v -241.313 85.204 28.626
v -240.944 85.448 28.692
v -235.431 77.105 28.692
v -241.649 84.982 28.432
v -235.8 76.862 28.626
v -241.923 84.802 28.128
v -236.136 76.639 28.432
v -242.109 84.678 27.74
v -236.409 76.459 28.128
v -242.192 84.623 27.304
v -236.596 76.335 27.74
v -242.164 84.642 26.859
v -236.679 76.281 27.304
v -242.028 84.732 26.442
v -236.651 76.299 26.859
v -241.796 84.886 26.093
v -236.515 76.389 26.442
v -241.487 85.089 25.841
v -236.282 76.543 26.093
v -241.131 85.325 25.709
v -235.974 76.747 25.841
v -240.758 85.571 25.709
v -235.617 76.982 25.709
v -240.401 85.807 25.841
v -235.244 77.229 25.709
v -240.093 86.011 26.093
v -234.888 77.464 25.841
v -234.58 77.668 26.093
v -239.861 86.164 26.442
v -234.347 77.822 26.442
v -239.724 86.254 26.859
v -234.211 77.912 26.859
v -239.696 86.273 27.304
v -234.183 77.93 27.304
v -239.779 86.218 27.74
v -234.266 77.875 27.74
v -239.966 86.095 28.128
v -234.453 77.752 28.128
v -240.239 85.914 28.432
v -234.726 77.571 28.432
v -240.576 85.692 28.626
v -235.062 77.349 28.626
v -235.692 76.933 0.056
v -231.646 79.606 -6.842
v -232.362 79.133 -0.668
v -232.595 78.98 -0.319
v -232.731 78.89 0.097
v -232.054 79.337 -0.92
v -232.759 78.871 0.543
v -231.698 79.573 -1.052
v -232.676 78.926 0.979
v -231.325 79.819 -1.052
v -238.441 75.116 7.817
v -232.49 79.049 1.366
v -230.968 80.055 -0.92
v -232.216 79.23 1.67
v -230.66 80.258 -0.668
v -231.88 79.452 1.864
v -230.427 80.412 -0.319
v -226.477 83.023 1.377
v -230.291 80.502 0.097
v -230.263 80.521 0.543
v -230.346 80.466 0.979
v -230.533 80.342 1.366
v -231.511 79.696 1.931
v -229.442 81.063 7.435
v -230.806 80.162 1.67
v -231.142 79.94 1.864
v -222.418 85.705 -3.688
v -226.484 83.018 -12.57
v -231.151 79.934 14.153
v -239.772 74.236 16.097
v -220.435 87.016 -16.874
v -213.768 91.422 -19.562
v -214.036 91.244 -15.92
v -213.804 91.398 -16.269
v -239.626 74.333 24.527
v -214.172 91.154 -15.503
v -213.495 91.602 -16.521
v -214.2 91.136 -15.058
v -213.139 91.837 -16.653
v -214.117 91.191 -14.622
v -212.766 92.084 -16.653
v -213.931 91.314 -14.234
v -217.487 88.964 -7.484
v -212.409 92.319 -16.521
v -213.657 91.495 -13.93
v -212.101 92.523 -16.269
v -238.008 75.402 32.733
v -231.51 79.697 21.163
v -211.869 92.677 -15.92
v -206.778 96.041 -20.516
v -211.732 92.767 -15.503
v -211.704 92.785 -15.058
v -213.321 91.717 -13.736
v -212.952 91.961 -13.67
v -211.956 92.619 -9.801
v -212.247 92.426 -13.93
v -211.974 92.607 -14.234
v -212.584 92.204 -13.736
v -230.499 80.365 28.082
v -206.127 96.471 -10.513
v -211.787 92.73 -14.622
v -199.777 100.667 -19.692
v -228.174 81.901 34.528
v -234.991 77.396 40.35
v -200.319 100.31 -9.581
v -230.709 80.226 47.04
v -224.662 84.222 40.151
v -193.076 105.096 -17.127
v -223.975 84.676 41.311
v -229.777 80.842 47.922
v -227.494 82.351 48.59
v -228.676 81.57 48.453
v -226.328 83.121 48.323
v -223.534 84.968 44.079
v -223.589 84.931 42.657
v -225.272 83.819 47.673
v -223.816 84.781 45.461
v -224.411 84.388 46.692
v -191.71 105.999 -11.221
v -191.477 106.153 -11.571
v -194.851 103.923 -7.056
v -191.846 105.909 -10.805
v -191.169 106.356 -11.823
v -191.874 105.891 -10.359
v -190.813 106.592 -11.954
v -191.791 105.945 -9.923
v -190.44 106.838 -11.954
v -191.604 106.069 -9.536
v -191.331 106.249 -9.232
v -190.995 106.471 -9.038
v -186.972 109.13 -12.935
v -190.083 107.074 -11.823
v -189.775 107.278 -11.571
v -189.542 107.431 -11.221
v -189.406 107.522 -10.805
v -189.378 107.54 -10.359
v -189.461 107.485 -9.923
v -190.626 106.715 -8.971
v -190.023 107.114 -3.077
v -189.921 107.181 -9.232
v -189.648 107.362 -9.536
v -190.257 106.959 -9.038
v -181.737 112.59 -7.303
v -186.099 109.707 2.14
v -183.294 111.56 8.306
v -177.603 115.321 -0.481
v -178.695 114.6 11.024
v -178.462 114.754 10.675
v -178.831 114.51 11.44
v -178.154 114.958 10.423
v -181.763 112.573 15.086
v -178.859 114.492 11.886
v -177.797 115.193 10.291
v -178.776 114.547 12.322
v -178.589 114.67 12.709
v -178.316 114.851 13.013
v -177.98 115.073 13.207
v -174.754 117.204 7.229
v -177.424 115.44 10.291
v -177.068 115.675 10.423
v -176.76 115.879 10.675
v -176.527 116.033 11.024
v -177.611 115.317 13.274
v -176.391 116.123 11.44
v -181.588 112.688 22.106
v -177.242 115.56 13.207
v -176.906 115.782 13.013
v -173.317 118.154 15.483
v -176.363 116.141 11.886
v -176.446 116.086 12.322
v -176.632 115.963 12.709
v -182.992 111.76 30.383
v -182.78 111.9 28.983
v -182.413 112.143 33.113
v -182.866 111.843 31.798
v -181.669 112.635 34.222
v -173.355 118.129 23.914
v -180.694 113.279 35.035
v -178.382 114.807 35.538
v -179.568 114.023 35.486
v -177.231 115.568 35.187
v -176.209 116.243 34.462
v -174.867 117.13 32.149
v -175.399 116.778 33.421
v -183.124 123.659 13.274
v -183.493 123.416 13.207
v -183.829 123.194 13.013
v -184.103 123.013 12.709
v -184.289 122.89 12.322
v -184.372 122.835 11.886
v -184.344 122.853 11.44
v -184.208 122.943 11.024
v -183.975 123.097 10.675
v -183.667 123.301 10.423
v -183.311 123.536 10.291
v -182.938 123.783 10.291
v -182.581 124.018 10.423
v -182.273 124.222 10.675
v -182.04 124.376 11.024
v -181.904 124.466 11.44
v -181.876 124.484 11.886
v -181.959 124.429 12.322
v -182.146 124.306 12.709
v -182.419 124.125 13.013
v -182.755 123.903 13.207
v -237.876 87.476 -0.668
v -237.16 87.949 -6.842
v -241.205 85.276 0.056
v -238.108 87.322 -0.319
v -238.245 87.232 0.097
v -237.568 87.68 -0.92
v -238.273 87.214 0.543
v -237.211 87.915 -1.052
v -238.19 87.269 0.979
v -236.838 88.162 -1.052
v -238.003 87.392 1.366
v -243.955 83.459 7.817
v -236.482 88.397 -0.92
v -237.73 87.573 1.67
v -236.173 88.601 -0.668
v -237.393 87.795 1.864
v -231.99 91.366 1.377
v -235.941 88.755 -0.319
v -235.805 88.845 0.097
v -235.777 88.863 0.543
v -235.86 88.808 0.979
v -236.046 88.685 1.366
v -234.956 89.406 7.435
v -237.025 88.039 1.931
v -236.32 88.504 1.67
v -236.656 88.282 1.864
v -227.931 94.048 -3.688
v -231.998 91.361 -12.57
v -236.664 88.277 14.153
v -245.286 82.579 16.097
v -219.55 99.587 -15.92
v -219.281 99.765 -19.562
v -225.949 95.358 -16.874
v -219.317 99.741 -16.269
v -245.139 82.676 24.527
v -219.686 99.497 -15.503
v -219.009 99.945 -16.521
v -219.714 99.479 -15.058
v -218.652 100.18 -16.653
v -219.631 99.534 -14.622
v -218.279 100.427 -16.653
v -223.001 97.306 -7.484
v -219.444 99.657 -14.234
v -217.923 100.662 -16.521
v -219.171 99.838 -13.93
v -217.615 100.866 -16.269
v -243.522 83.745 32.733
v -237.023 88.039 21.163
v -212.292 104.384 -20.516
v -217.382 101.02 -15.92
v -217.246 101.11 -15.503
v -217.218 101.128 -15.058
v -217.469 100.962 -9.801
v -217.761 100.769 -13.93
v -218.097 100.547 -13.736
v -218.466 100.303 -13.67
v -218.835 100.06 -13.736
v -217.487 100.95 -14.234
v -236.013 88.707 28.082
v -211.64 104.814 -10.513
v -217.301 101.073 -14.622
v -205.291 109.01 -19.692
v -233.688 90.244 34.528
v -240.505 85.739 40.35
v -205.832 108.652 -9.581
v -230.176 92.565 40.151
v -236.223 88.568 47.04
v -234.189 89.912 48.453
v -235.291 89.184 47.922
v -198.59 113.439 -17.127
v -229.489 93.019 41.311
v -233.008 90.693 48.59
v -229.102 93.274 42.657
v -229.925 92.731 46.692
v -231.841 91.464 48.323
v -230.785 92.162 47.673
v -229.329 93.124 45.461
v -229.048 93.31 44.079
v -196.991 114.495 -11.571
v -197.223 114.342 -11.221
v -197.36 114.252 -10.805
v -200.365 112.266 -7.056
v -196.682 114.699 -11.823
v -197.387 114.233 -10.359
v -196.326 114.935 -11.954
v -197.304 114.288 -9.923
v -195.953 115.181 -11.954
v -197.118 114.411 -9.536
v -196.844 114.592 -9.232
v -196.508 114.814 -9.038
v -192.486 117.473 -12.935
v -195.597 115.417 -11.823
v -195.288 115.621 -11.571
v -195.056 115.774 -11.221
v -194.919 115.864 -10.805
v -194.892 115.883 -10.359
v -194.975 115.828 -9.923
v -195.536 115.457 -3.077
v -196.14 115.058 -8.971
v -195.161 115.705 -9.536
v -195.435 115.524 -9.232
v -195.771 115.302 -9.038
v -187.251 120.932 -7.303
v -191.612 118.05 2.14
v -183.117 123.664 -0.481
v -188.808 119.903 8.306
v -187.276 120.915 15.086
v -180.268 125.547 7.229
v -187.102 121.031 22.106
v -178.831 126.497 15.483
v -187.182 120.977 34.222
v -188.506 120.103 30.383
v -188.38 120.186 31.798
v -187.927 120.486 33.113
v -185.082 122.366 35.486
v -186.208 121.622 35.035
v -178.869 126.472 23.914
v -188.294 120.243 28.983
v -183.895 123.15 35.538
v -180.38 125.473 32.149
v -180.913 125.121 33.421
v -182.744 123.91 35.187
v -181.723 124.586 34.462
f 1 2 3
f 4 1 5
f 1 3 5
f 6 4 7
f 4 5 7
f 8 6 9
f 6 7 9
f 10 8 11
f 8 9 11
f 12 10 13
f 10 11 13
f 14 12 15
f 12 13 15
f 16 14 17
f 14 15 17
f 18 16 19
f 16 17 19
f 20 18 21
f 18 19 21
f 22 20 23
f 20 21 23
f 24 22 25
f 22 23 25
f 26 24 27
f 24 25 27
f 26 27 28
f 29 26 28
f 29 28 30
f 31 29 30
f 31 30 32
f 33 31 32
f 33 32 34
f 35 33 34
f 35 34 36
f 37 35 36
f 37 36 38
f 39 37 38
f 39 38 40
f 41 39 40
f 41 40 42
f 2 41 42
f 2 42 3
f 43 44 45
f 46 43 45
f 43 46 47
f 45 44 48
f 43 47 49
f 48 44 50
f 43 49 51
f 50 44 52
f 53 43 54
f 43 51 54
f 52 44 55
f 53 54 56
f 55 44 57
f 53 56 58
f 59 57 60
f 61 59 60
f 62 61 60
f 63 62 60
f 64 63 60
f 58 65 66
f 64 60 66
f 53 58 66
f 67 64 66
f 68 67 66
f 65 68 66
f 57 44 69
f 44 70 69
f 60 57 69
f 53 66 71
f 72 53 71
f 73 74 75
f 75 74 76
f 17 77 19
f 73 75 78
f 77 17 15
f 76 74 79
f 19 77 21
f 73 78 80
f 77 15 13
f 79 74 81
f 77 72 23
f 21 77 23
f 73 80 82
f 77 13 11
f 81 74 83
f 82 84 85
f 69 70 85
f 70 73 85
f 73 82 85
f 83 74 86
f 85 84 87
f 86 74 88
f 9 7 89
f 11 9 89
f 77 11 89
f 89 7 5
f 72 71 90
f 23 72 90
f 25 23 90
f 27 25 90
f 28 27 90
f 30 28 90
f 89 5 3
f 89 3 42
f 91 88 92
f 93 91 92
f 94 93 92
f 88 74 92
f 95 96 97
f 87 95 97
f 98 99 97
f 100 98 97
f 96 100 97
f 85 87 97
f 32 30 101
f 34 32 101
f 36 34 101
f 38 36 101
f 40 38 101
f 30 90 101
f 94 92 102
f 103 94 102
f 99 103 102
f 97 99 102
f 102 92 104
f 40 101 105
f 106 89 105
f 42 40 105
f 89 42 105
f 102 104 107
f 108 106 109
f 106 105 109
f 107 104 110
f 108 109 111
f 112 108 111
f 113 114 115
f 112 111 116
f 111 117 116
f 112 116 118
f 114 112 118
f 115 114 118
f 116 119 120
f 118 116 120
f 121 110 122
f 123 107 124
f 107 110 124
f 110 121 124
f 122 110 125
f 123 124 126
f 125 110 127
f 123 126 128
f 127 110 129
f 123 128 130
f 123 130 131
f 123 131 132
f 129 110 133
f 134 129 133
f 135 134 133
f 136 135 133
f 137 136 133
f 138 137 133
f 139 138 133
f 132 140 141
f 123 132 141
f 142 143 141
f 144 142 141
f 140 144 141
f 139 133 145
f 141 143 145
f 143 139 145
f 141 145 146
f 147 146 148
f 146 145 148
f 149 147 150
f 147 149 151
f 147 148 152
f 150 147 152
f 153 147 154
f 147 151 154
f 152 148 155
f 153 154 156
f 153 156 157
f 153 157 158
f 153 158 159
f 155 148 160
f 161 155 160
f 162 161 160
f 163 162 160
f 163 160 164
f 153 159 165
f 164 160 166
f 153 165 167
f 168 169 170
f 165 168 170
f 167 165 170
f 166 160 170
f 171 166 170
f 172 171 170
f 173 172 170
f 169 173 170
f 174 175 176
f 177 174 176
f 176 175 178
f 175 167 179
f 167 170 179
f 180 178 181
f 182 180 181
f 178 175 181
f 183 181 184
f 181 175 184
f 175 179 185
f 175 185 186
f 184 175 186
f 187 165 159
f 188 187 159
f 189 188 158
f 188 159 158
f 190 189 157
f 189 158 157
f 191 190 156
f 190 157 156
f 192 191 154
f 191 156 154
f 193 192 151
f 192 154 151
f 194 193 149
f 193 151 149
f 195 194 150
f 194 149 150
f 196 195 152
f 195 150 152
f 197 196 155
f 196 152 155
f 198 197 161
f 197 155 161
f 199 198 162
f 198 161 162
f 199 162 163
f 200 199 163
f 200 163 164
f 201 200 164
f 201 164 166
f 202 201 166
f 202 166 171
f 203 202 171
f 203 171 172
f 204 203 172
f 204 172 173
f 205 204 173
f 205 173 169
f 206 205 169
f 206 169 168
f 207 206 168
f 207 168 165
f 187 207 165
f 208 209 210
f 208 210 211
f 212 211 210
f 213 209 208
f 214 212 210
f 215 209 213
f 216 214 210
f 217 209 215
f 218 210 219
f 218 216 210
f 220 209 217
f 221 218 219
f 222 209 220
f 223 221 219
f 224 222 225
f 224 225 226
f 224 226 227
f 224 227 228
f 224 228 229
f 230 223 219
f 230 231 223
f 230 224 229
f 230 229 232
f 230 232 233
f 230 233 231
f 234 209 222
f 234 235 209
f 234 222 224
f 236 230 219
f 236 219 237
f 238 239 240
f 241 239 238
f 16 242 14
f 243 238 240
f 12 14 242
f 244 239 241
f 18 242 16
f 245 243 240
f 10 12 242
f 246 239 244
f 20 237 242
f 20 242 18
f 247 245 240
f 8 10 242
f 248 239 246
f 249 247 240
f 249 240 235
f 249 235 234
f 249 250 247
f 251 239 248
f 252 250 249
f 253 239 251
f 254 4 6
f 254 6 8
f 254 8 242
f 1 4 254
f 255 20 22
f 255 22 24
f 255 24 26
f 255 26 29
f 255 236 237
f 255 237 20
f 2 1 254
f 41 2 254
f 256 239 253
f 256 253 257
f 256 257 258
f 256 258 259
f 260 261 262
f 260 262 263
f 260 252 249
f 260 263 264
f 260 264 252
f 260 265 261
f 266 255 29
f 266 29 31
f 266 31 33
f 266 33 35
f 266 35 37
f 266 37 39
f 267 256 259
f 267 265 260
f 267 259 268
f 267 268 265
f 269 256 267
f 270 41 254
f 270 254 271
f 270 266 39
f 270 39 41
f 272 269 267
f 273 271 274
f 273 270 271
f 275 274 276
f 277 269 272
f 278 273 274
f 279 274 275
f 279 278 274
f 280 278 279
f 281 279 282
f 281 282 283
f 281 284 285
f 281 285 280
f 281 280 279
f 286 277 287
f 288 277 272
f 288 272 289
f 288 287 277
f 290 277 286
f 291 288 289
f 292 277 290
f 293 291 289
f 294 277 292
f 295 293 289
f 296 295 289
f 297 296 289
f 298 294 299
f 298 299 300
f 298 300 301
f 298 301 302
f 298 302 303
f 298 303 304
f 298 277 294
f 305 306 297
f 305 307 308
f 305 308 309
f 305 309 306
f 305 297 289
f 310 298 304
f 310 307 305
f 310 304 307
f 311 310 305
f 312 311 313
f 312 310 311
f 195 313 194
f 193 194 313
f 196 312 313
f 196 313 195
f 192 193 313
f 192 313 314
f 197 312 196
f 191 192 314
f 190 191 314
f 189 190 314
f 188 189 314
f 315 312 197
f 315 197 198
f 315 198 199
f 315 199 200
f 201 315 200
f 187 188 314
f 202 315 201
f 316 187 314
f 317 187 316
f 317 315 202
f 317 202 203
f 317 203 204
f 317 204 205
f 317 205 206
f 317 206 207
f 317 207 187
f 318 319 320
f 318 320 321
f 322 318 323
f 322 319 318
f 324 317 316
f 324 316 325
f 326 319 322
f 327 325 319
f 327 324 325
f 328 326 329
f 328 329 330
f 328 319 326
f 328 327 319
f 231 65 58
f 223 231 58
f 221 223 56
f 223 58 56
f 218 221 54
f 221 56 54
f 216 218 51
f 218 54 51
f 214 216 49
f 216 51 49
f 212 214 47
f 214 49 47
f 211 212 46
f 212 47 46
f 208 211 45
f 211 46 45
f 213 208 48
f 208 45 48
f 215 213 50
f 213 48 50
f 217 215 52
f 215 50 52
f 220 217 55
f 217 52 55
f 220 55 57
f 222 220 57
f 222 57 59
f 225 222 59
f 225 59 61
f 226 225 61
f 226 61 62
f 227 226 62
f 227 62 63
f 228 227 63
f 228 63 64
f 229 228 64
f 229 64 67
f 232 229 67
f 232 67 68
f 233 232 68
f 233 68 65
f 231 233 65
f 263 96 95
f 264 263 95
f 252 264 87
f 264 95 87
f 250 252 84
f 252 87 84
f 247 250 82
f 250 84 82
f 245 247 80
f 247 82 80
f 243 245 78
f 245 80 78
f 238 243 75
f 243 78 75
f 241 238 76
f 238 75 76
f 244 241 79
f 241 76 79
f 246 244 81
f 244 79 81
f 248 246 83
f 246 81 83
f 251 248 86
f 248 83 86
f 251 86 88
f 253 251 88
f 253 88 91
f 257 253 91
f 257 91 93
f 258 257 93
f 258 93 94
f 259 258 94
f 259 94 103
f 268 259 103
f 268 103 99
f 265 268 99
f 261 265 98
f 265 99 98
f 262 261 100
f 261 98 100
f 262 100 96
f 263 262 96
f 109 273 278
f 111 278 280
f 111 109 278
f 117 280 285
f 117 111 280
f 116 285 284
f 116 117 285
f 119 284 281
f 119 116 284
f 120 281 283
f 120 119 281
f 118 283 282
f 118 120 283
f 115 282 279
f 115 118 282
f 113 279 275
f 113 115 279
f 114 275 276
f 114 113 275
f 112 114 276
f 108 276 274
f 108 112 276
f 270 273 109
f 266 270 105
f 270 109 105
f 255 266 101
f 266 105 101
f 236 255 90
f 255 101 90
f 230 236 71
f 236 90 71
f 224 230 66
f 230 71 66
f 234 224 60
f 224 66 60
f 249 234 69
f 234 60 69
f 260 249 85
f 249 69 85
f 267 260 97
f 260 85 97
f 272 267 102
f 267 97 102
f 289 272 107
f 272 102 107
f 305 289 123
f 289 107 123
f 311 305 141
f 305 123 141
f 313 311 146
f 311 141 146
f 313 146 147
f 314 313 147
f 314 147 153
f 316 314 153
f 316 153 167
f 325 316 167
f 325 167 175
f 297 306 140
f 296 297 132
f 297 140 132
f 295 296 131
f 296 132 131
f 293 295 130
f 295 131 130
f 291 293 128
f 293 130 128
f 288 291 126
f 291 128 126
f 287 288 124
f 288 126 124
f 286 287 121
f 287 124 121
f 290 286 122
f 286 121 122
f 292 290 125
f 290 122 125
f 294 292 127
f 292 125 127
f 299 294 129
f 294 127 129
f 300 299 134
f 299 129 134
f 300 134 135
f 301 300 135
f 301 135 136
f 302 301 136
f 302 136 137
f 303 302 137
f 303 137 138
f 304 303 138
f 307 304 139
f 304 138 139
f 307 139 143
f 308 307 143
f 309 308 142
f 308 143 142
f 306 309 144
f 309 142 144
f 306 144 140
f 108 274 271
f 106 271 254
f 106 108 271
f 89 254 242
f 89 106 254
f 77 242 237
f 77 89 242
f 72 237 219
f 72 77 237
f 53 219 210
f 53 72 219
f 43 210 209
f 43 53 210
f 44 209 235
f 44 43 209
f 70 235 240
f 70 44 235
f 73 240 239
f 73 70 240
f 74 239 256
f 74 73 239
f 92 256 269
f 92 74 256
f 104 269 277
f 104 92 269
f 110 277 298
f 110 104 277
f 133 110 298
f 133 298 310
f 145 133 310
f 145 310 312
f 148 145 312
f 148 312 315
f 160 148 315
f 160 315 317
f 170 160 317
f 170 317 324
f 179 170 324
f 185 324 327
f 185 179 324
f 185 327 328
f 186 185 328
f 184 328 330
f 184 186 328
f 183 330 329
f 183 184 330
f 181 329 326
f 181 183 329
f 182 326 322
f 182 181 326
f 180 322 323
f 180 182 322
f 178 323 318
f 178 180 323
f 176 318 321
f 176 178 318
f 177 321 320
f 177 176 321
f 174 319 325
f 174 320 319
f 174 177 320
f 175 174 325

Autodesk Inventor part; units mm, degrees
ref_plane "Work Plane1" through (-147.3677, -4.0754, 130.4495) normal (-0.5513437, 0.8342782, 0) x (0, 0, 1)
ref_plane "Work Plane2" through (-176.5966, 115.9868, 180.7146) normal (-0.5513437, 0.8342782, 0) x (0.1811695, 0.1197283, 0.9761366)
sketch "Sketch2" plane through (-176.5966, 115.9868, 180.7146) normal (-0.5513437, 0.8342782, 0) x (0.1811695, 0.1197283, 0.9761366)
  arc A0 (82.4936, -40) -> (107.4936, -33.3012) centre (82.4936, 10) ccw projected
  line L0 (107.4936, -33.3012) -> (126.4432, -22.3607) projected
  arc A1 (132.9687, -23.7251) -> (126.4432, -22.3607) centre (128.9432, -26.6908) ccw projected
  arc A2 (132.9687, -23.7251) -> (132.9687, 23.7251) centre (165.173, 0) ccw projected
  arc A3 (126.4432, 22.3607) -> (132.9687, 23.7251) centre (128.9432, 26.6908) ccw projected
  line L1 (126.4432, 22.3607) -> (107.4936, 33.3012) projected
  arc A4 (107.4936, 33.3012) -> (82.4936, 40) centre (82.4936, -10) ccw projected
  line L2 (-82.4936, 40) -> (82.4936, 40) projected
  arc A5 (-82.4936, 40) -> (-107.4936, 33.3012) centre (-82.4936, -10) ccw projected
  line L3 (-107.4936, 33.3012) -> (-126.4432, 22.3607) projected
  arc A6 (-132.9687, 23.7251) -> (-126.4432, 22.3607) centre (-128.9432, 26.6908) ccw projected
  arc A7 (-132.9687, 23.7251) -> (-132.9687, -23.7251) centre (-165.173, 0) ccw projected
  arc A8 (-126.4432, -22.3607) -> (-132.9687, -23.7251) centre (-128.9432, -26.6908) ccw projected
  line L4 (-126.4432, -22.3607) -> (-107.4936, -33.3012) projected
  arc A9 (-107.4936, -33.3012) -> (-82.4936, -40) centre (-82.4936, 10) ccw projected
  line L5 (82.4936, -40) -> (-82.4936, -40) projected
  arc A10 (3.6764, 4.0958) -> (3.6764, -4.0958) centre (6.5442, 0) ccw projected
  line L6 (3.6764, -4.0958) -> (20.5406, -15.9042) projected
  arc A11 (17.6727, -25) -> (20.5406, -15.9042) centre (17.6727, -20) ccw projected
  line L7 (17.6727, -25) -> (-19.8928, -25) projected
  arc A12 (-22.7607, -24.0958) -> (-19.8928, -25) centre (-19.8928, -20) ccw projected
  line L8 (-22.7607, -24.0958) -> (-51.3236, -4.0958) projected
  arc A13 (-51.3236, 4.0958) -> (-51.3236, -4.0958) centre (-48.4558, 0) ccw projected
  line L9 (-51.3236, 4.0958) -> (-22.7607, 24.0958) projected
  arc A14 (-19.8928, 25) -> (-22.7607, 24.0958) centre (-19.8928, 20) ccw projected
  line L10 (-19.8928, 25) -> (17.6727, 25) projected
  arc A15 (20.5406, 15.9042) -> (17.6727, 25) centre (17.6727, 20) ccw projected
  line L11 (20.5406, 15.9042) -> (3.6764, 4.0958) projected
  line L12 (-50.2924, 21.3617) -> (-62.1293, 13.0734) projected
  arc A16 (-64.2764, 12.9796) -> (-62.1293, 13.0734) centre (-63.2764, 14.7117) ccw projected
  line L13 (-64.2764, 12.9796) -> (-78.6322, 21.2679) projected
  arc A17 (-77.6322, 25) -> (-78.6322, 21.2679) centre (-77.6322, 23) ccw projected
  line L14 (-77.6322, 25) -> (-51.4395, 25) projected
  arc A18 (-50.2924, 21.3617) -> (-51.4395, 25) centre (-51.4395, 23) ccw projected
  line L15 (-62.1293, -13.0734) -> (-50.2924, -21.3617) projected
  arc A19 (-51.4395, -25) -> (-50.2924, -21.3617) centre (-51.4395, -23) ccw projected
  line L16 (-51.4395, -25) -> (-77.6322, -25) projected
  arc A20 (-78.6322, -21.2679) -> (-77.6322, -25) centre (-77.6322, -23) ccw projected
  line L17 (-78.6322, -21.2679) -> (-64.2764, -12.9796) projected
  arc A21 (-62.1293, -13.0734) -> (-64.2764, -12.9796) centre (-63.2764, -14.7117) ccw projected
  line L18 (-102.673, -23.5566) -> (-119.3236, -13.9434) projected
  arc A22 (-121.8236, -9.6132) -> (-119.3236, -13.9434) centre (-116.8236, -9.6132) ccw projected
  line L19 (-121.8236, -9.6132) -> (-121.8236, 9.6132) projected
  arc A23 (-119.3236, 13.9434) -> (-121.8236, 9.6132) centre (-116.8236, 9.6132) ccw projected
  line L20 (-119.3236, 13.9434) -> (-102.673, 23.5566) projected
  arc A24 (-97.673, 23.5566) -> (-102.673, 23.5566) centre (-100.173, 19.2265) ccw projected
  line L21 (-97.673, 23.5566) -> (-81.0224, 13.9434) projected
  arc A25 (-78.5224, 9.6132) -> (-81.0224, 13.9434) centre (-83.5224, 9.6132) ccw projected
  line L22 (-78.5224, 9.6132) -> (-78.5224, -9.6132) projected
  arc A26 (-81.0224, -13.9434) -> (-78.5224, -9.6132) centre (-83.5224, -9.6132) ccw projected
  line L23 (-81.0224, -13.9434) -> (-97.673, -23.5566) projected
  arc A27 (-102.673, -23.5566) -> (-97.673, -23.5566) centre (-100.173, -19.2265) ccw projected
  line L24 (72.827, -25) -> (57.1072, -25) projected
  arc A28 (54.2393, -24.0958) -> (57.1072, -25) centre (57.1072, -20) ccw projected
  line L25 (54.2393, -24.0958) -> (25.6764, -4.0958) projected
  arc A29 (25.6764, 4.0958) -> (25.6764, -4.0958) centre (28.5442, 0) ccw projected
  line L26 (25.6764, 4.0958) -> (54.2393, 24.0958) projected
  arc A30 (57.1072, 25) -> (54.2393, 24.0958) centre (57.1072, 20) ccw projected
  line L27 (57.1072, 25) -> (72.827, 25) projected
  arc A31 (77.827, 20) -> (72.827, 25) centre (72.827, 20) ccw projected
  line L28 (77.827, 20) -> (77.827, -20) projected
  arc A32 (72.827, -25) -> (77.827, -20) centre (72.827, -20) ccw projected
  circle A33 centre (-165.173, 0) radius 11 projected
  circle A34 centre (105.173, 0) radius 8 projected
  line L29 (87.4451, -10.7279) -> (97.4451, -10.7279) projected
  arc A35 (97.4451, -14.7279) -> (97.4451, -10.7279) centre (97.4451, -12.7279) ccw projected
  line L30 (97.4451, -14.7279) -> (87.4451, -14.7279) projected
  arc A36 (87.4451, -10.7279) -> (87.4451, -14.7279) centre (87.4451, -12.7279) ccw projected
  line L31 (122.9009, -14.7279) -> (112.9009, -14.7279) projected
  arc A37 (112.9009, -10.7279) -> (112.9009, -14.7279) centre (112.9009, -12.7279) ccw projected
  line L32 (112.9009, -10.7279) -> (122.9009, -10.7279) projected
  arc A38 (122.9009, -14.7279) -> (122.9009, -10.7279) centre (122.9009, -12.7279) ccw projected
  line L33 (97.4451, 10.7279) -> (87.4451, 10.7279) projected
  arc A39 (87.4451, 14.7279) -> (87.4451, 10.7279) centre (87.4451, 12.7279) ccw projected
  line L34 (87.4451, 14.7279) -> (97.4451, 14.7279) projected
  arc A40 (97.4451, 10.7279) -> (97.4451, 14.7279) centre (97.4451, 12.7279) ccw projected
  line L35 (122.9009, 10.7279) -> (112.9009, 10.7279) projected
  arc A41 (112.9009, 14.7279) -> (112.9009, 10.7279) centre (112.9009, 12.7279) ccw projected
  line L36 (112.9009, 14.7279) -> (122.9009, 14.7279) projected
  arc A42 (122.9009, 10.7279) -> (122.9009, 14.7279) centre (122.9009, 12.7279) ccw projected
  line L37 (169.046, 1) -> (169.973, 1) projected
  line L38 (169.973, 1) -> (169.973, -1) projected
  line L39 (169.973, -1) -> (169.046, -1) projected
  arc A43 (169.046, 1) -> (169.046, -1) centre (165.173, 0) ccw projected
  circle A44 centre (158.2448, -4) radius 2 projected
  circle A45 centre (172.1012, -4) radius 2 projected
  circle A46 centre (165.173, 8) radius 2 projected
  circle A47 centre (145.374, -19.799) radius 1.6 projected
  circle A48 centre (165.173, -28) radius 1.6 projected
  circle A49 centre (184.972, -19.799) radius 1.6 projected
  circle A50 centre (193.173, 0) radius 1.6 projected
  circle A51 centre (184.972, 19.799) radius 1.6 projected
  circle A52 centre (165.173, 28) radius 1.6 projected
  circle A53 centre (145.374, 19.799) radius 1.6 projected
  circle A54 centre (137.173, 0) radius 1.6 projected
  circle A55 centre (-165.173, -16.0004) radius 1.55 projected
  circle A56 centre (-149.1726, 0) radius 1.55 projected
  circle A57 centre (-165.173, 16.0004) radius 1.55 projected
  circle A58 centre (-181.1734, 0) radius 1.55 projected
  arc A59 (-141.0198, 17.7938) -> (-141.0198, -17.7938) centre (-165.173, 0) ccw
  arc A60 (-141.0198, 17.7938) -> (-121.4432, 13.7004) centre (-128.9432, 26.6908) ccw
  line L40 (-121.4432, 13.7004) -> (-102.4936, 24.641)
  arc A61 (-82.4936, 30) -> (-102.4936, 24.641) centre (-82.4936, -10) ccw
  line L41 (-82.4936, 30) -> (82.4936, 30)
  arc A62 (102.4936, 24.641) -> (82.4936, 30) centre (82.4936, -10) ccw
  line L42 (102.4936, 24.641) -> (121.4432, 13.7004)
  arc A63 (121.4432, 13.7004) -> (141.0198, 17.7938) centre (128.9432, 26.6908) ccw
  arc A64 (141.0198, -17.7938) -> (141.0198, 17.7938) centre (165.173, 0) ccw
  arc A65 (141.0198, -17.7938) -> (121.4432, -13.7004) centre (128.9432, -26.6908) ccw
  line L43 (121.4432, -13.7004) -> (102.4936, -24.641)
  arc A66 (82.4936, -30) -> (102.4936, -24.641) centre (82.4936, 10) ccw
  line L44 (82.4936, -30) -> (-82.4936, -30)
  arc A67 (-102.4936, -24.641) -> (-82.4936, -30) centre (-82.4936, 10) ccw
  line L45 (-102.4936, -24.641) -> (-121.4432, -13.7004)
  arc A68 (-121.4432, -13.7004) -> (-141.0198, -17.7938) centre (-128.9432, -26.6908) ccw
  arc A69 (-144.5699, -34.2857) -> (-149.7207, -25.7143) centre (-147.1453, -30) ccw
  line L46 (-205.173, 0) -> (-195.173, 0)
  arc A70 (-149.7207, 25.7143) -> (-144.5699, 34.2857) centre (-147.1453, 30) ccw
  point P0 (-158.2951, 120.6357)
  point P1 (-149.7207, 25.7143)
  point P2 (-144.5699, 34.2857)
  dimension "d4" = 10
  dimension "d5" = 30
extrude "Extrusion2" add sketch "Sketch2" along normal blind 10 contours A7 L46 A59 A69 | A7 A70 A59 L46
ref_plane "Work Plane3" through (-213.7676, 91.4218, -19.5622) normal (0.8143695, 0.5381868, -0.2171572) x (0.1811695, 0.1197283, 0.9761366)
sketch "Sketch3" plane through (-182.11, 124.3296, 180.7146) normal (-0.5513437, 0.8342782, 0) x (0.8143695, 0.5381868, -0.2171572)
  circle A0 centre (0, 200.673) radius 3.75 projected
  circle A1 centre (35.5, 165.173) radius 3.75 projected
  circle A2 centre (0, 129.673) radius 3.75 projected
  circle A3 centre (-35.5, 165.173) radius 3.75 projected
  circle A4 centre (-25.1023, 140.0707) radius 3.75 projected
  circle A5 centre (25.1023, 140.0707) radius 3.75 projected
  circle A6 centre (25.1023, 190.2753) radius 3.75 projected
  circle A7 centre (-25.1023, 190.2753) radius 3.75 projected
  circle A8 centre (0, 165.173) radius 40 projected
  circle A9 centre (0, 165.173) radius 30.089 projected
  point P0 (120.6357, 158.2951)
hole "Hole1" at (-218.4658, 100.3034, -15.1697) at (-196.1395, 115.058, -10.4712) at (-183.1242, 123.6594, 11.7741) at (-187.044, 121.0689, 38.5353) at (-205.6028, 108.8041, 54.136) at (-227.9291, 94.0495, 49.4376) at (-240.9444, 85.4481, 27.1923) at (-237.0246, 88.0386, 0.4311) direction (0.5513437, -0.8342782, 0) diameter 3 end through all
properties part number "spacer"
